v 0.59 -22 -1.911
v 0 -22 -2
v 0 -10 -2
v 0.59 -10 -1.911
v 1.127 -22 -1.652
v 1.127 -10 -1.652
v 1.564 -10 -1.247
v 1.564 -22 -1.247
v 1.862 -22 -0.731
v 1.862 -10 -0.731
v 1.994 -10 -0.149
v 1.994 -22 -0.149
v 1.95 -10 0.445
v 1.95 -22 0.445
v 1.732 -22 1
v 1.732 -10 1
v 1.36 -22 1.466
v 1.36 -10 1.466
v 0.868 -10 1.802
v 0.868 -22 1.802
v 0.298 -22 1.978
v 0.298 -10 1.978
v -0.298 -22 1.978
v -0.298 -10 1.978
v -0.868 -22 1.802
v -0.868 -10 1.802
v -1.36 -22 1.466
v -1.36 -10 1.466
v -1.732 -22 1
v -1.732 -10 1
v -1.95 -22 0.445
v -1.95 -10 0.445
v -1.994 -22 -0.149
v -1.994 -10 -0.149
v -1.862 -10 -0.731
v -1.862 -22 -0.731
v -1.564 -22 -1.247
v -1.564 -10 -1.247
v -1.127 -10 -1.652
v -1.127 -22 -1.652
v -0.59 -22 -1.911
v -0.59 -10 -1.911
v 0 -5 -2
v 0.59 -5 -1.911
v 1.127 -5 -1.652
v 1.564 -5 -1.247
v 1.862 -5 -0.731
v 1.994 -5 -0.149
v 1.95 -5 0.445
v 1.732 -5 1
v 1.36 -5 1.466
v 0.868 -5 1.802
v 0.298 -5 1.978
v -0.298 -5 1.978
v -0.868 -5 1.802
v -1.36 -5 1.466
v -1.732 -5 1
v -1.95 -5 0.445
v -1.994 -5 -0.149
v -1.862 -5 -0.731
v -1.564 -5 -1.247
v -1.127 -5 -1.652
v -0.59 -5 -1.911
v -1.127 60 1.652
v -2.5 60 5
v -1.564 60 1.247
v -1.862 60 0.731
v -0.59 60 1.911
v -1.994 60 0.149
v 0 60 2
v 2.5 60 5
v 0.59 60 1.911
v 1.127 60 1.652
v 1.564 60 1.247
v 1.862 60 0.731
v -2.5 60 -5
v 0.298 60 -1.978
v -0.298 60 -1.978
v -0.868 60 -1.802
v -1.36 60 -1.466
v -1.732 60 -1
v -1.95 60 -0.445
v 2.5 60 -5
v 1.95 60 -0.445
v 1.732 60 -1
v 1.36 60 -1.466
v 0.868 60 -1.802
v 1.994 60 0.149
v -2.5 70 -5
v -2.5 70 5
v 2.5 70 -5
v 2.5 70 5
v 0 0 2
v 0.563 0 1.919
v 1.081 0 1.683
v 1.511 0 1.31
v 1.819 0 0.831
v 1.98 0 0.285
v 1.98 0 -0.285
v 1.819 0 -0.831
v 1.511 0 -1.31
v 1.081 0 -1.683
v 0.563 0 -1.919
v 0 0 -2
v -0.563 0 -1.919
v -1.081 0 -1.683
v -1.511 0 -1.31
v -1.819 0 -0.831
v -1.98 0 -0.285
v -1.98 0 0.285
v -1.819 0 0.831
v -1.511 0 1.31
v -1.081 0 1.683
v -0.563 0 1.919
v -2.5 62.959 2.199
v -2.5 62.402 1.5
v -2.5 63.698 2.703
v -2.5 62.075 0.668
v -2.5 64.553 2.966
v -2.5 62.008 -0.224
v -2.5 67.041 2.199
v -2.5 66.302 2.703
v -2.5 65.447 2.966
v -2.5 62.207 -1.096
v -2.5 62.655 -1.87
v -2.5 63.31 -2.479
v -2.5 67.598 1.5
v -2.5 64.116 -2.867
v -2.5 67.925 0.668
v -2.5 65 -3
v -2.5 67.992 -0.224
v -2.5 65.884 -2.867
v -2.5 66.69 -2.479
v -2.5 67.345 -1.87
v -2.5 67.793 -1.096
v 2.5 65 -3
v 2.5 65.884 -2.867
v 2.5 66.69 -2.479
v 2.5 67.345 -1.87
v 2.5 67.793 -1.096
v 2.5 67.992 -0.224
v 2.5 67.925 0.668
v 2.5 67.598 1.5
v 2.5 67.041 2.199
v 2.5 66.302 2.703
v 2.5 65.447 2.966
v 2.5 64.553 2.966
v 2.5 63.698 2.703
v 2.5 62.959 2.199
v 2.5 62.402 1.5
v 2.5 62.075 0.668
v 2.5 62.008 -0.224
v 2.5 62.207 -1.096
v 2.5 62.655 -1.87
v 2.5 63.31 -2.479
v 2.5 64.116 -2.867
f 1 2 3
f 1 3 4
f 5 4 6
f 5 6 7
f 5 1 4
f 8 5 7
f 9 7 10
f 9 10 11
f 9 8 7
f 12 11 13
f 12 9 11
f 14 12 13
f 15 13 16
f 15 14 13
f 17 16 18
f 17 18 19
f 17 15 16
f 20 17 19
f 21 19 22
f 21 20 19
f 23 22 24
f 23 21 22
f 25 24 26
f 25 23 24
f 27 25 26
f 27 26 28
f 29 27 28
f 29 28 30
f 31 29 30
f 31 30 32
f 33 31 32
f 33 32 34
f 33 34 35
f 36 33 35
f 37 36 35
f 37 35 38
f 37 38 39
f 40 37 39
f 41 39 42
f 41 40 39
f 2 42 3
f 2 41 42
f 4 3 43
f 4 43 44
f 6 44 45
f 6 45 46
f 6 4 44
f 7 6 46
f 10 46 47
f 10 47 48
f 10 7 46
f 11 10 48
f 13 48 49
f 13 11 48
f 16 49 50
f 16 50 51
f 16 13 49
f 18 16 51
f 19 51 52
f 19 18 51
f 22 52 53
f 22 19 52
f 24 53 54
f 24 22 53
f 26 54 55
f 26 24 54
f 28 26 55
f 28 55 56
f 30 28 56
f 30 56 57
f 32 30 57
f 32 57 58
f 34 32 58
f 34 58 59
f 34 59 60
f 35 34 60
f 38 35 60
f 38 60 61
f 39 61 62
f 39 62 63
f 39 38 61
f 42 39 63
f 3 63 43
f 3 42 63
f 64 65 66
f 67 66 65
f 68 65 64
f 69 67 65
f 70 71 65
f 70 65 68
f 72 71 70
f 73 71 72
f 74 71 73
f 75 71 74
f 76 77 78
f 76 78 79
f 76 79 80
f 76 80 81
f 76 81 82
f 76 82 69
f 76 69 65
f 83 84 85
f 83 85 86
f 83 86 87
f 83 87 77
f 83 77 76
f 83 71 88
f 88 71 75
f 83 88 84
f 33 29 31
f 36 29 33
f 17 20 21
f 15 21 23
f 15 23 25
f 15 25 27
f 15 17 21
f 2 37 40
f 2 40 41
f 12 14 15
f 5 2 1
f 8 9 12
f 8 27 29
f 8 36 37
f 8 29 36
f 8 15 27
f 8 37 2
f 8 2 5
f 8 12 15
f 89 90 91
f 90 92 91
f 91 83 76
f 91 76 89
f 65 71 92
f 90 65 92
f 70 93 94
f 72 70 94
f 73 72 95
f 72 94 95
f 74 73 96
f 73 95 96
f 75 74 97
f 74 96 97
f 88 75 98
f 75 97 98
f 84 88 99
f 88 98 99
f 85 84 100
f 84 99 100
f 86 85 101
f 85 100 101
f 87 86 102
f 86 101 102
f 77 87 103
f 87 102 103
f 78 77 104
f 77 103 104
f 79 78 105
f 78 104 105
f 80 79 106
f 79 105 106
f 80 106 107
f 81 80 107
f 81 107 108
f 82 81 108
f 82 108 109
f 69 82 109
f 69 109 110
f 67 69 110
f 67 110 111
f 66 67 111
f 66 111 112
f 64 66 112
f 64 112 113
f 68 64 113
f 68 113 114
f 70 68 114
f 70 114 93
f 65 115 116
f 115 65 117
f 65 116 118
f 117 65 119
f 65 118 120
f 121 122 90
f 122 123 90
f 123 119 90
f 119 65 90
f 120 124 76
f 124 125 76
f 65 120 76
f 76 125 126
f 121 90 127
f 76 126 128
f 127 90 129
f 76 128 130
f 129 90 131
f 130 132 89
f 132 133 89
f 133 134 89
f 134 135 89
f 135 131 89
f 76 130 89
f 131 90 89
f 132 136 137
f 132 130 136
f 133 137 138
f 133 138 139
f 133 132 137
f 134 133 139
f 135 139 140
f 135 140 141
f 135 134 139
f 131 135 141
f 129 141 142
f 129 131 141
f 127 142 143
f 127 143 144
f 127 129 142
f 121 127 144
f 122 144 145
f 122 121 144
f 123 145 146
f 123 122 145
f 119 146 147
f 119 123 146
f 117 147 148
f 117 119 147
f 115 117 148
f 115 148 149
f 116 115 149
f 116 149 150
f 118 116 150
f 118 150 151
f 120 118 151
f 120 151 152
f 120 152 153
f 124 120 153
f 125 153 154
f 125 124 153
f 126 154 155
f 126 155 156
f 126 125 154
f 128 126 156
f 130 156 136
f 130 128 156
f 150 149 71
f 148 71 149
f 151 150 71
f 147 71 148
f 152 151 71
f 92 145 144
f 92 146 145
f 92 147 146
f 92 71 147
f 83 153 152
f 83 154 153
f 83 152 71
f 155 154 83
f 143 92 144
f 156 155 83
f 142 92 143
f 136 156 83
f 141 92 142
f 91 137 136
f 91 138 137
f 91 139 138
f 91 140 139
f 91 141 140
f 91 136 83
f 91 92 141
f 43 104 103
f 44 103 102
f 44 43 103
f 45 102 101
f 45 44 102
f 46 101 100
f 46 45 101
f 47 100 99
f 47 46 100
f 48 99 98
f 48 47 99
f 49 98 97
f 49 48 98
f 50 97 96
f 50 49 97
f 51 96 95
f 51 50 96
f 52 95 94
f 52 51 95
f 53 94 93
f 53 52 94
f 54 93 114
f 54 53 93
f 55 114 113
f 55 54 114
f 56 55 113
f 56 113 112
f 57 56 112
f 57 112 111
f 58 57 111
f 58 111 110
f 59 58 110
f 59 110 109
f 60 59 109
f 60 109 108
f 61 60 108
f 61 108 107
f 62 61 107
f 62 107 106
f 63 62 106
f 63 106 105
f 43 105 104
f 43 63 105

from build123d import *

# Parameters (mm, degrees)
SKETCH_1_R       = 2
EXTRUDE_1_DEPTH  = 60
SKETCH_8_W       = 10
SKETCH_8_H       = 10
SKETCH_8_R       = 3
EXTRUDE_8_DEPTH  = 2.5
EXTRUDE_START    = 5
SKETCH_9_R       = 2
EXTRUDE_9_DEPTH  = 5
SKETCH_12_R      = 2
EXTRUDE_11_DEPTH = 5
EXTRUDE_START_2  = 7
SKETCH_10_R      = 2
EXTRUDE_10_DEPTH = 12


with BuildPart() as part:
    # 草图1 → 凸台-拉伸1 (new body)
    with BuildSketch(Plane(origin=(0, 0, 0), x_dir=(1, 0, 0), z_dir=(0, 1, 0))):
        Circle(SKETCH_1_R)
    extrude(amount=EXTRUDE_1_DEPTH)

    # 草图8 → 凸台-拉伸8 (add, symmetric)
    with BuildSketch(Plane(origin=(0, 0, 0), x_dir=(0, 0, -1), z_dir=(1, 0, 0))):
        with Locations((0, 65)):
            Rectangle(SKETCH_8_W, SKETCH_8_H)
        with Locations((0, 65)):
            Circle(SKETCH_8_R, mode=Mode.SUBTRACT)
    extrude(amount=EXTRUDE_8_DEPTH, both=True)

    # 草图9 → 凸台-拉伸9 (add)
    with BuildSketch(Plane.XZ.offset(EXTRUDE_START)):
        Circle(SKETCH_9_R)
    extrude(amount=-EXTRUDE_9_DEPTH)

    # 草图12 → 凸台-拉伸11 (add)
    with BuildSketch(Plane.XZ.offset(5).offset(EXTRUDE_START)):
        Circle(SKETCH_12_R)
    extrude(amount=-EXTRUDE_11_DEPTH)

    # 草图10 → 凸台-拉伸10 (add)
    with BuildSketch(Plane.XZ.offset(15).offset(EXTRUDE_START_2)):
        Circle(SKETCH_10_R)
    extrude(amount=-EXTRUDE_10_DEPTH)


solid = part.part
